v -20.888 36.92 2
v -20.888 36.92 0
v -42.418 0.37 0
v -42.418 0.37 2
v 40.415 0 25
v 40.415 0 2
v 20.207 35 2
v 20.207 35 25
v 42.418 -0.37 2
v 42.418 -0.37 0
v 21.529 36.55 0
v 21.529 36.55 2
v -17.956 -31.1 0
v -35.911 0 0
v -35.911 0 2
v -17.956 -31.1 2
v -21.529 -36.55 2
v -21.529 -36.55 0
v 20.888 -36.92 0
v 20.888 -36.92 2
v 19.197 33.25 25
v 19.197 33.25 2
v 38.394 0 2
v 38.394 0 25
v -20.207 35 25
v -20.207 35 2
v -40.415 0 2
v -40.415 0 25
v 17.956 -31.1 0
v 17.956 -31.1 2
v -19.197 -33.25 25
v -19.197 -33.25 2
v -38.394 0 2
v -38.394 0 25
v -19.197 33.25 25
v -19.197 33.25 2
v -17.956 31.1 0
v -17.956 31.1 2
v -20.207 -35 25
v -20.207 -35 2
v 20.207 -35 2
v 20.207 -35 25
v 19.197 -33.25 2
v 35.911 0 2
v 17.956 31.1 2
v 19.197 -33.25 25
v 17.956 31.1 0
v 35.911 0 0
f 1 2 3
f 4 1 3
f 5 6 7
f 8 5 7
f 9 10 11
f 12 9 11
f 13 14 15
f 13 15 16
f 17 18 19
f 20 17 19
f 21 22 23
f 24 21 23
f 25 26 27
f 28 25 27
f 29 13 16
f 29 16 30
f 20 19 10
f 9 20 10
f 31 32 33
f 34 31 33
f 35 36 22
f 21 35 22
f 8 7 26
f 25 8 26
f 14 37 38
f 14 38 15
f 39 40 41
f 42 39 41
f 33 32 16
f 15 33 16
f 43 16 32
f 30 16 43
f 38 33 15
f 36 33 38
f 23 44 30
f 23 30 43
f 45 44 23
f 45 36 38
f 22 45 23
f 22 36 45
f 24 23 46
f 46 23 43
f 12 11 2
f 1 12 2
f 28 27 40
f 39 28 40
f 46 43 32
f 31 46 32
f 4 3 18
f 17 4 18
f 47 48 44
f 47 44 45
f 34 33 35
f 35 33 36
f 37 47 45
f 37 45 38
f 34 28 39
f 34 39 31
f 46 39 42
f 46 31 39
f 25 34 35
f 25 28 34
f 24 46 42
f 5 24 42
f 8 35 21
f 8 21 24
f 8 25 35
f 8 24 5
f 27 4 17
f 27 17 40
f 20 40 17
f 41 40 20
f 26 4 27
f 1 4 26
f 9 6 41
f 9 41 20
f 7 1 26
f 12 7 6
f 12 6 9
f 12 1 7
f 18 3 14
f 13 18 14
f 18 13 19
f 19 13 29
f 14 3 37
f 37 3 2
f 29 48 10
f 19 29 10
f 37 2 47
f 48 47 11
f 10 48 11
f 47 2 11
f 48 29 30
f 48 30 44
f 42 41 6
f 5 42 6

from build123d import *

# Parameters (mm, degrees)
F1_DEPTH = 25
F3_DEPTH = 2
F5_DEPTH = 15.1


with BuildPart() as f1:
    # F0 (on Top) → F1 (new body)
    with BuildSketch(Plane.XY):
        Polygon((20.207259, -35), (40.414519, 0), (20.207259, 35), (-20.207259, 35), (-40.414519, 0), (-20.207259, -35), align=None)
        Polygon((19.196896, 33.25), (38.393793, 0), (19.196896, -33.25), (-19.196896, -33.25), (-38.393793, 0), (-19.196896, 33.25), align=None, mode=Mode.SUBTRACT)
    extrude(amount=F1_DEPTH)

    # F2 (on Top) → F3 (join)
    with BuildSketch(Plane.XY):
        Polygon((20.888331, -36.919732), (42.417591, -0.370041), (21.52926, 36.549691), (-20.888331, 36.919732), (-42.417591, 0.370041), (-21.52926, -36.549691), align=None)
    extrude(amount=F3_DEPTH)

    # F4 (on Top) → F5 (cut)
    with BuildSketch(Plane.XY):
        Polygon((17.955634, -31.100071), (35.911268, 0), (17.955634, 31.100071), (-17.955634, 31.100071), (-35.911268, 0), (-17.955634, -31.100071), align=None)
    extrude(amount=F5_DEPTH, mode=Mode.SUBTRACT)


solid = f1.part
